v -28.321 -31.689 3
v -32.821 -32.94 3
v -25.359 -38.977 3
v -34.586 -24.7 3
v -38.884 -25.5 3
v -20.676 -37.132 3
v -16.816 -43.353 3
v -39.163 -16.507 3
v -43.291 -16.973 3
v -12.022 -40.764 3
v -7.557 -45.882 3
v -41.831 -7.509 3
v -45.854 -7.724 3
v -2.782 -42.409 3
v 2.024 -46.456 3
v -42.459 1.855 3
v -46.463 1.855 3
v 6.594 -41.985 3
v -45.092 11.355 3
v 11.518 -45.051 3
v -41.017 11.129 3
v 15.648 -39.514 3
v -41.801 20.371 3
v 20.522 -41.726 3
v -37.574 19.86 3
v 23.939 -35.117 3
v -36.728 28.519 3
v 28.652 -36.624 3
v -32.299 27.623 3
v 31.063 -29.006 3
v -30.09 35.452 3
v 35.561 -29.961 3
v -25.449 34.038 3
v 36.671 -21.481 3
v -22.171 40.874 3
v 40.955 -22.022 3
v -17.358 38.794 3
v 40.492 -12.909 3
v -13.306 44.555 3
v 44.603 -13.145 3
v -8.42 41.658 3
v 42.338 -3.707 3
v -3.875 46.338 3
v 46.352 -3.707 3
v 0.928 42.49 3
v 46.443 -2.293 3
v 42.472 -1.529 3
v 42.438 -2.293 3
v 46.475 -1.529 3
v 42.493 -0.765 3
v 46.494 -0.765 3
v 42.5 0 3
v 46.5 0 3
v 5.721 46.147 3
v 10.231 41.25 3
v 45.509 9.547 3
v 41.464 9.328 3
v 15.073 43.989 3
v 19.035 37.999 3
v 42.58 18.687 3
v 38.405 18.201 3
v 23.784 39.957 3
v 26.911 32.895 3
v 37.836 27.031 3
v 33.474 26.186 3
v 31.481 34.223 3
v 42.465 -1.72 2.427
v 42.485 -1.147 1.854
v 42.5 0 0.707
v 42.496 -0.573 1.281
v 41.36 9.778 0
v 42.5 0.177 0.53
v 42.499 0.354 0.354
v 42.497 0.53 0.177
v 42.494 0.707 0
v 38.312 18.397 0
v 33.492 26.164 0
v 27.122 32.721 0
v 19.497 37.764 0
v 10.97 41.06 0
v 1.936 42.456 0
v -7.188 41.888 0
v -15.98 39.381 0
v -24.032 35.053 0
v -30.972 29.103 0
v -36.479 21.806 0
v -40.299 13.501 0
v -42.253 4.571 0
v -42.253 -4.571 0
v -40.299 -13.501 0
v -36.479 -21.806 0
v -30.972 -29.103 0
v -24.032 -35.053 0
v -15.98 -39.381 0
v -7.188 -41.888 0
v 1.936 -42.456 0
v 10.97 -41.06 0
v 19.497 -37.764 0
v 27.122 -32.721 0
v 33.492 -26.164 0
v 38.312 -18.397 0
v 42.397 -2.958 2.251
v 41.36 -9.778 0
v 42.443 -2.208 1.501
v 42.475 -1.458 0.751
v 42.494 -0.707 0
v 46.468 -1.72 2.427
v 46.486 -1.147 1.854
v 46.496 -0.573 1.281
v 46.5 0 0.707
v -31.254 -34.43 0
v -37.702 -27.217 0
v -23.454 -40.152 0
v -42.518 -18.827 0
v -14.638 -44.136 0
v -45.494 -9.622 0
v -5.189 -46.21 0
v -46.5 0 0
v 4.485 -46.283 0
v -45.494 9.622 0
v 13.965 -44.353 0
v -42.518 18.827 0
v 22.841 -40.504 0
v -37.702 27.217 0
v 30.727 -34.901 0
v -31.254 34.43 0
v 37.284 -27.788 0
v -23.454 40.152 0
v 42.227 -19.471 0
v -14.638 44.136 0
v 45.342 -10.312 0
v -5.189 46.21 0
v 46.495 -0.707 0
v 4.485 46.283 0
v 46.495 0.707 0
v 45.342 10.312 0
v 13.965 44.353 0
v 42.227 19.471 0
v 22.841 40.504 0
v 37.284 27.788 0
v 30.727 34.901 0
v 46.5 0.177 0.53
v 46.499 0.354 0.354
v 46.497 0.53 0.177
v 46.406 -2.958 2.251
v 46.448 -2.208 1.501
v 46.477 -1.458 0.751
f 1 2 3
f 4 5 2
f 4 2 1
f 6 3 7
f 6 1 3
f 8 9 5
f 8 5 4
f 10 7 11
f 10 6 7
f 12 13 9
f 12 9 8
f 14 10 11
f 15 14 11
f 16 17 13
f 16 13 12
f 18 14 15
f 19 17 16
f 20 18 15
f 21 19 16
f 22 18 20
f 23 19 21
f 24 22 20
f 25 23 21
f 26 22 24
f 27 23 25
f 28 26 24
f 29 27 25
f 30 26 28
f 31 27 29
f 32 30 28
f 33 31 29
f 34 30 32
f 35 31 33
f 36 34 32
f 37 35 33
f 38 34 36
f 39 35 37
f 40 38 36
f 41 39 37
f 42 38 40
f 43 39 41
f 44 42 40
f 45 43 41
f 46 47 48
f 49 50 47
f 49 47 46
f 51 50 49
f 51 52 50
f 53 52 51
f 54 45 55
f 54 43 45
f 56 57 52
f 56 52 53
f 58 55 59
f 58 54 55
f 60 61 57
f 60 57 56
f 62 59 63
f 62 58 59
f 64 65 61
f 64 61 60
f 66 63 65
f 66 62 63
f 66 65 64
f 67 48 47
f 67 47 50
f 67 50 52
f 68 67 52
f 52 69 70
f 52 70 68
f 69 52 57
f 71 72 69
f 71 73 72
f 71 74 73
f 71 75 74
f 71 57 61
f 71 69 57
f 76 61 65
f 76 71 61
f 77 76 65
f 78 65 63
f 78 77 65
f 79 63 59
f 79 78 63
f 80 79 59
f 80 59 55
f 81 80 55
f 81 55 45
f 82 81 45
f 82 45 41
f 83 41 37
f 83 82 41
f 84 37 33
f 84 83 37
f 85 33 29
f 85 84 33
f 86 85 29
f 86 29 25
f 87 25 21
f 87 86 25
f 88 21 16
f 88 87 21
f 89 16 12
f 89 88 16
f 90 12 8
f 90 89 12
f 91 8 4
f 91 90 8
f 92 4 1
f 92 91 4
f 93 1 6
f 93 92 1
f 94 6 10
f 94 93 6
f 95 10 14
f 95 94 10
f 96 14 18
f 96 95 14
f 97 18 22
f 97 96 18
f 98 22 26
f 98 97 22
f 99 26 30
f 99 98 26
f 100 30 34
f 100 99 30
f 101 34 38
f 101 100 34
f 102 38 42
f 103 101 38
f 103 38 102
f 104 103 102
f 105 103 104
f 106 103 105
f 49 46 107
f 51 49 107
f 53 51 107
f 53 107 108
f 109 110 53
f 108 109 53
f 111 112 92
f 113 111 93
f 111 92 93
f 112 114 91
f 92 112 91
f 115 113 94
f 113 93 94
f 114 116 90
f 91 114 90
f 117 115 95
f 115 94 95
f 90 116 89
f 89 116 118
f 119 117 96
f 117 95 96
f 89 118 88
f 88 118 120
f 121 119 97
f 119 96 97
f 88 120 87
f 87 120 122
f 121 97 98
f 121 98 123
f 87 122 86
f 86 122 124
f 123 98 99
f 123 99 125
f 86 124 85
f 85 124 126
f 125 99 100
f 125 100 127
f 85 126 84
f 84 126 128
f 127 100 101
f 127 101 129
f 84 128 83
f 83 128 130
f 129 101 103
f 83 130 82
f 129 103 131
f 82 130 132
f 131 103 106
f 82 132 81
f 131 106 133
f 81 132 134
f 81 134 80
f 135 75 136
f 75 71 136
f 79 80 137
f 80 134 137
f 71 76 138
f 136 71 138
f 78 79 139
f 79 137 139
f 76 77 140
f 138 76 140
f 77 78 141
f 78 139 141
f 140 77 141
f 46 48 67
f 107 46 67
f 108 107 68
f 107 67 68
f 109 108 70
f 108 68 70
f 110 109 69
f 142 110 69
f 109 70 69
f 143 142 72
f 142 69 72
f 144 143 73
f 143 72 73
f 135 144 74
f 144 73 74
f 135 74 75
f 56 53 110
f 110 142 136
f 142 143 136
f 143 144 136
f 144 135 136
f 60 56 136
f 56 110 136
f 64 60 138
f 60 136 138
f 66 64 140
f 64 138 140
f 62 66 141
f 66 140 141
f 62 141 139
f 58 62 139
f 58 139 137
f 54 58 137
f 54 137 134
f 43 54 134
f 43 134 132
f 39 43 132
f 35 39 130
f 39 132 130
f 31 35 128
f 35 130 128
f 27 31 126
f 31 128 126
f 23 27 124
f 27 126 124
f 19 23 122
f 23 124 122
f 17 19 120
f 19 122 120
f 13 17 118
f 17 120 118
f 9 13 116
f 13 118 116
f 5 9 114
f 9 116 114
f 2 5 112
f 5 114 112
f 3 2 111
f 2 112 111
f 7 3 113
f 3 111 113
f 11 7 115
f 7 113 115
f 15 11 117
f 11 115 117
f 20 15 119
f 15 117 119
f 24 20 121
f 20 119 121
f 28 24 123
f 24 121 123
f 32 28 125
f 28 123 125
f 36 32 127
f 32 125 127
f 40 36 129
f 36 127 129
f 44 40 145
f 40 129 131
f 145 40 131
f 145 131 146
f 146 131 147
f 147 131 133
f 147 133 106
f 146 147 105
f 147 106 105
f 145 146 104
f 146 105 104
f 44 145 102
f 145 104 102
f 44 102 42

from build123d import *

# Parameters (mm, degrees)
SKETCH1_R               = 46.5
SKETCH1_R_2             = 42.5
BOSS_EXTRUDE1_DEPTH     = 3
CUT_EXTRUDE2_REACH      = 67.829
CUT_EXTRUDE2_END_RADIUS = 46.5


with BuildPart() as part:
    # Sketch1 → Boss-Extrude1 (new body)
    with BuildSketch(Plane.XY):
        Circle(SKETCH1_R)
        Circle(SKETCH1_R_2, mode=Mode.SUBTRACT)
    extrude(amount=BOSS_EXTRUDE1_DEPTH)

    # Cut-Extrude2: up to this cylinder (the profile starts inside it)
    cut_extrude2_end = Plane(origin=(0, 0, -0.237725), z_dir=(0, 0, -1)) * Cylinder(CUT_EXTRUDE2_END_RADIUS, 229.658, mode=Mode.PRIVATE)
    # Sketch2 → Cut-Extrude2 (cut, up to the surface)
    with BuildSketch(Plane(origin=(0, 0, 0), x_dir=(0, 0, -1), z_dir=(1, 0, 0)), mode=Mode.PRIVATE) as cut_extrude2_sk1:
        Polygon((-14.60888812, -13.901781339), (14.377231128, 15.08433791), (15.08433791, 14.377231128), (-13.901781339, -14.60888812), align=None)
    cut_extrude2_tool1 = extrude(cut_extrude2_sk1.sketch, amount=CUT_EXTRUDE2_REACH, mode=Mode.PRIVATE) & cut_extrude2_end
    add(cut_extrude2_tool1.solids().sort_by_distance((0, 0.237725, -0.237725))[0], mode=Mode.SUBTRACT)


solid = part.part
